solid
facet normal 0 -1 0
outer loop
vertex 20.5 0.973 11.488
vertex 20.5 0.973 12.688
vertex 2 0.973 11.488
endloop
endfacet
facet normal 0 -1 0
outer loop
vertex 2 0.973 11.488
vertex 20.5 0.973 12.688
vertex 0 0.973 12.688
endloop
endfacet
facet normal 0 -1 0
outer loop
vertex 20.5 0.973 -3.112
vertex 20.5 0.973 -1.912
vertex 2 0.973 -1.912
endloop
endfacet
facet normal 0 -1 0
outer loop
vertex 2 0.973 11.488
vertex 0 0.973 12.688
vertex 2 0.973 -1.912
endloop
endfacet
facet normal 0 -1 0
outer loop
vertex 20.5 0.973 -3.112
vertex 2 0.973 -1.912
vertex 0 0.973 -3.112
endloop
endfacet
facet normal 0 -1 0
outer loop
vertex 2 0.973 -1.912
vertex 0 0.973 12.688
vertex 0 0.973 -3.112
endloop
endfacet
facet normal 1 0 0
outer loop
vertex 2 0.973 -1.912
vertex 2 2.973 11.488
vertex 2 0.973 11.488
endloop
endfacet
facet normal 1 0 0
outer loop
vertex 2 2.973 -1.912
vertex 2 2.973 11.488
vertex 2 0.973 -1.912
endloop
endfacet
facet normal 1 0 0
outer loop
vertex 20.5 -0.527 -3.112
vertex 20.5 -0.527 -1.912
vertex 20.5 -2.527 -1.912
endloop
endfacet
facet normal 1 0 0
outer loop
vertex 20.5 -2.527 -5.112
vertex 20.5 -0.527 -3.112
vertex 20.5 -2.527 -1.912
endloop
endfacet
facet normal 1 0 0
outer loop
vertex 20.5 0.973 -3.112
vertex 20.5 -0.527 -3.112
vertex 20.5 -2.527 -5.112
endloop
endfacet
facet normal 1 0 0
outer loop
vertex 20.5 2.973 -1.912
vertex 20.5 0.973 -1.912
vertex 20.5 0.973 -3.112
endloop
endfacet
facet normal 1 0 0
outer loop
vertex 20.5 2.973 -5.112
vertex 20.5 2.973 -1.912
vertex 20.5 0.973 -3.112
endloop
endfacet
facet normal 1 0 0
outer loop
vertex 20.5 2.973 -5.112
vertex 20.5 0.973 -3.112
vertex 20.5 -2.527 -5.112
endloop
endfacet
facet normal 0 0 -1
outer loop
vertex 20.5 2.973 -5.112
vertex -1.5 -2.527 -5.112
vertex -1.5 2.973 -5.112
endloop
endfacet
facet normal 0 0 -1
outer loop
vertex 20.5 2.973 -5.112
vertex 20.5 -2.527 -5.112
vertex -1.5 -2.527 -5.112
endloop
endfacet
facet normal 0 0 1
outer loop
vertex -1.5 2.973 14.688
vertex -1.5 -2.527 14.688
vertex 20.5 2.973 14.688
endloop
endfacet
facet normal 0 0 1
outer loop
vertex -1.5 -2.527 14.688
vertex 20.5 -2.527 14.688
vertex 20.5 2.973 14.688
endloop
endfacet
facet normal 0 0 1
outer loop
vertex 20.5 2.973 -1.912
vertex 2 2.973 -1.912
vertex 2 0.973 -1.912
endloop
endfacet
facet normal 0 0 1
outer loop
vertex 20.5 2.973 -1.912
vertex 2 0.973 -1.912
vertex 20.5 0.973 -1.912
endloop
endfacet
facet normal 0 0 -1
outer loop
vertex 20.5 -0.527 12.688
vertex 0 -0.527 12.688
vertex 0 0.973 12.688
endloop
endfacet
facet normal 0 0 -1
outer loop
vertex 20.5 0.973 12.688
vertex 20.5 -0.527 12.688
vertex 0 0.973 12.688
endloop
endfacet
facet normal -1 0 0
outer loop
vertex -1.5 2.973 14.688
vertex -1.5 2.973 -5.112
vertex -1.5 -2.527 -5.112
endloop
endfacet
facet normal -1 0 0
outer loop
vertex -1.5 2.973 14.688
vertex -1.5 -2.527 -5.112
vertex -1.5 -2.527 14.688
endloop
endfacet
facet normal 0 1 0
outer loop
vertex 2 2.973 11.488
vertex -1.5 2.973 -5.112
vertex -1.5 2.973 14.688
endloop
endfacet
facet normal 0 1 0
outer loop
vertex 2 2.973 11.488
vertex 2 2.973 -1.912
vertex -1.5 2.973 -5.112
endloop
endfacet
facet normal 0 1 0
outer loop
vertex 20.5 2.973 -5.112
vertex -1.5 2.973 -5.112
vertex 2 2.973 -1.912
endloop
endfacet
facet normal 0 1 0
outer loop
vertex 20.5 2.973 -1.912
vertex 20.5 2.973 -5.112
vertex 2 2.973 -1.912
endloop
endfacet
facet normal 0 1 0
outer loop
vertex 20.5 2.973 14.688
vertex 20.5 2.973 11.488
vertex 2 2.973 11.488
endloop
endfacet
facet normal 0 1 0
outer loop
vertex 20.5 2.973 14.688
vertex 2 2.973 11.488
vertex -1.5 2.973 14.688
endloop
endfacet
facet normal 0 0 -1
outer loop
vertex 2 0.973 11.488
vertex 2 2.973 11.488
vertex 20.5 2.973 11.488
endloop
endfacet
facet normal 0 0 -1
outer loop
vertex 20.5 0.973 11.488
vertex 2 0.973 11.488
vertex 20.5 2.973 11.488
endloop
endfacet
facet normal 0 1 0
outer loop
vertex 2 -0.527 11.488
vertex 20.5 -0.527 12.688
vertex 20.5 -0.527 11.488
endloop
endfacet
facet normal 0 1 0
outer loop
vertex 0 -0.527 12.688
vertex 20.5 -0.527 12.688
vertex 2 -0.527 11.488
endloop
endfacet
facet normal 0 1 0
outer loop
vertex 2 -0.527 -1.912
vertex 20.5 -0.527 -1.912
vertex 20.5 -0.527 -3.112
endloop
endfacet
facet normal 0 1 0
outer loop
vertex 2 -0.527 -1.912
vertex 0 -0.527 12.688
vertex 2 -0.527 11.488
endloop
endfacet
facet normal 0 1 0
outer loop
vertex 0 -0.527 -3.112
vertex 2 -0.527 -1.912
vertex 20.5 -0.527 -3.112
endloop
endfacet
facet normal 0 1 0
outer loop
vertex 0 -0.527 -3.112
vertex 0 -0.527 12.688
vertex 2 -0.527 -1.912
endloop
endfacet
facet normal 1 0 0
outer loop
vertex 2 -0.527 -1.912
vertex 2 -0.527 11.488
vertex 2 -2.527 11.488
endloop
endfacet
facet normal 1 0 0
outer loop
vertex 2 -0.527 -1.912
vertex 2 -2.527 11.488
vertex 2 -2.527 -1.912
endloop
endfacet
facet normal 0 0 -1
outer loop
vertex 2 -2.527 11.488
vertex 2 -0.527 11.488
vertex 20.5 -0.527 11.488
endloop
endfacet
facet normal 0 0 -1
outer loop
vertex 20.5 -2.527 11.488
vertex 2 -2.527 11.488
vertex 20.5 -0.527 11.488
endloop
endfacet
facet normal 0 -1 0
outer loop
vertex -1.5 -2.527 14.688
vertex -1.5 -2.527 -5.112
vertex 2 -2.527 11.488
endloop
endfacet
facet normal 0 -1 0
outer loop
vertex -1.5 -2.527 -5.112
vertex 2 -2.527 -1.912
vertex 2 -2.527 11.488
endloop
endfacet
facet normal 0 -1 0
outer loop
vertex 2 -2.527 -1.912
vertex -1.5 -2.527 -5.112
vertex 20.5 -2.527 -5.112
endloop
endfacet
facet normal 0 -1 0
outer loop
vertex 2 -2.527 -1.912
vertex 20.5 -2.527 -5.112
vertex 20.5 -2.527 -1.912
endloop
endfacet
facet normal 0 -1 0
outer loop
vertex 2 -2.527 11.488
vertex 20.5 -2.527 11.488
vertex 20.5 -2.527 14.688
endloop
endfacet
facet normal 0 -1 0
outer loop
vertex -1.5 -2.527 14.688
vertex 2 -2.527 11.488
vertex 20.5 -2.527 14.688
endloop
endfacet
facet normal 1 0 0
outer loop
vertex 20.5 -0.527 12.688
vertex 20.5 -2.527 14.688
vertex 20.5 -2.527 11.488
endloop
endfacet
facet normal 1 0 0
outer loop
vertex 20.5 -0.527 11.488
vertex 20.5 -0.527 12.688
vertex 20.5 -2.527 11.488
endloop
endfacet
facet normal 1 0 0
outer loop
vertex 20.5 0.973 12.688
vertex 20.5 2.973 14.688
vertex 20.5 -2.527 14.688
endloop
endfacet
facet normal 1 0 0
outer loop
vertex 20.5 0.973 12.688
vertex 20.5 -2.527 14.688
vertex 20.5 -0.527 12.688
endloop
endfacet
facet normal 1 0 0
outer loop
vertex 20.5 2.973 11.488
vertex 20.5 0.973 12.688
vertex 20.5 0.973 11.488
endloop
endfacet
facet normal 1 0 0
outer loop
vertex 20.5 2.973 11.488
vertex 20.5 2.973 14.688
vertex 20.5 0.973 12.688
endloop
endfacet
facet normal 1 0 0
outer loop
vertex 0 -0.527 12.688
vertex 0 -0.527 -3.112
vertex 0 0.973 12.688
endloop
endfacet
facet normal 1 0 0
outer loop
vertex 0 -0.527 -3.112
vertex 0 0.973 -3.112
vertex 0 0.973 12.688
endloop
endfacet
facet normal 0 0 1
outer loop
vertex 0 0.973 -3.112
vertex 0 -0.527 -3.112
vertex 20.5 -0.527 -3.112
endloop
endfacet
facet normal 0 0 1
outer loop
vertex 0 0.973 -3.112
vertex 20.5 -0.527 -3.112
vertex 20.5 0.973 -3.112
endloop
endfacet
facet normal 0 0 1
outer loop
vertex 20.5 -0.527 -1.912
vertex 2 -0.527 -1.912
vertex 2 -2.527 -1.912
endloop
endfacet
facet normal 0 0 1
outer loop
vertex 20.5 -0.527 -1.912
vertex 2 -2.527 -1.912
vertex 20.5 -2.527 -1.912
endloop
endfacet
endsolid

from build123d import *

# Parameters (mm, degrees)
SKETCH1_W           = 19.8
SKETCH1_H           = 5.5
SKETCH1_W_2         = 15.8
SKETCH1_H_2         = 1.5
BOSS_EXTRUDE1_DEPTH = 20.5
SKETCH2_W           = 18.5
SKETCH2_H           = 13.4
CUT_EXTRUDE1_DEPTH  = 6.5
SKETCH3_W           = 19.8
SKETCH3_H           = 5.5
BOSS_EXTRUDE2_DEPTH = 1.5


with BuildPart() as part:
    # Sketch1 → Boss-Extrude1 (new body)
    with BuildSketch(Plane(origin=(0, 0, 0), x_dir=(0, 0, -1), z_dir=(1, 0, 0))):
        with Locations((-4.788231672, 0.223036412)):
            Rectangle(SKETCH1_W, SKETCH1_H)
        with Locations((-4.788231672, 0.223036412)):
            Rectangle(SKETCH1_W_2, SKETCH1_H_2, mode=Mode.SUBTRACT)
    extrude(amount=BOSS_EXTRUDE1_DEPTH)

    # Sketch2 → Cut-Extrude1 (cut, through all)
    with BuildSketch(Plane(origin=(0, 2.973036412, 0), x_dir=(1, 0, 0), z_dir=(0, 1, 0))):
        with Locations((11.25, -4.788231672)):
            Rectangle(SKETCH2_W, SKETCH2_H)
    extrude(amount=-CUT_EXTRUDE1_DEPTH, mode=Mode.SUBTRACT)

    # Sketch3 → Boss-Extrude2 (add)
    with BuildSketch(Plane.ZY):
        with Locations((4.788231672, 0.223036412)):
            Rectangle(SKETCH3_W, SKETCH3_H)
    extrude(amount=BOSS_EXTRUDE2_DEPTH)


solid = part.part
